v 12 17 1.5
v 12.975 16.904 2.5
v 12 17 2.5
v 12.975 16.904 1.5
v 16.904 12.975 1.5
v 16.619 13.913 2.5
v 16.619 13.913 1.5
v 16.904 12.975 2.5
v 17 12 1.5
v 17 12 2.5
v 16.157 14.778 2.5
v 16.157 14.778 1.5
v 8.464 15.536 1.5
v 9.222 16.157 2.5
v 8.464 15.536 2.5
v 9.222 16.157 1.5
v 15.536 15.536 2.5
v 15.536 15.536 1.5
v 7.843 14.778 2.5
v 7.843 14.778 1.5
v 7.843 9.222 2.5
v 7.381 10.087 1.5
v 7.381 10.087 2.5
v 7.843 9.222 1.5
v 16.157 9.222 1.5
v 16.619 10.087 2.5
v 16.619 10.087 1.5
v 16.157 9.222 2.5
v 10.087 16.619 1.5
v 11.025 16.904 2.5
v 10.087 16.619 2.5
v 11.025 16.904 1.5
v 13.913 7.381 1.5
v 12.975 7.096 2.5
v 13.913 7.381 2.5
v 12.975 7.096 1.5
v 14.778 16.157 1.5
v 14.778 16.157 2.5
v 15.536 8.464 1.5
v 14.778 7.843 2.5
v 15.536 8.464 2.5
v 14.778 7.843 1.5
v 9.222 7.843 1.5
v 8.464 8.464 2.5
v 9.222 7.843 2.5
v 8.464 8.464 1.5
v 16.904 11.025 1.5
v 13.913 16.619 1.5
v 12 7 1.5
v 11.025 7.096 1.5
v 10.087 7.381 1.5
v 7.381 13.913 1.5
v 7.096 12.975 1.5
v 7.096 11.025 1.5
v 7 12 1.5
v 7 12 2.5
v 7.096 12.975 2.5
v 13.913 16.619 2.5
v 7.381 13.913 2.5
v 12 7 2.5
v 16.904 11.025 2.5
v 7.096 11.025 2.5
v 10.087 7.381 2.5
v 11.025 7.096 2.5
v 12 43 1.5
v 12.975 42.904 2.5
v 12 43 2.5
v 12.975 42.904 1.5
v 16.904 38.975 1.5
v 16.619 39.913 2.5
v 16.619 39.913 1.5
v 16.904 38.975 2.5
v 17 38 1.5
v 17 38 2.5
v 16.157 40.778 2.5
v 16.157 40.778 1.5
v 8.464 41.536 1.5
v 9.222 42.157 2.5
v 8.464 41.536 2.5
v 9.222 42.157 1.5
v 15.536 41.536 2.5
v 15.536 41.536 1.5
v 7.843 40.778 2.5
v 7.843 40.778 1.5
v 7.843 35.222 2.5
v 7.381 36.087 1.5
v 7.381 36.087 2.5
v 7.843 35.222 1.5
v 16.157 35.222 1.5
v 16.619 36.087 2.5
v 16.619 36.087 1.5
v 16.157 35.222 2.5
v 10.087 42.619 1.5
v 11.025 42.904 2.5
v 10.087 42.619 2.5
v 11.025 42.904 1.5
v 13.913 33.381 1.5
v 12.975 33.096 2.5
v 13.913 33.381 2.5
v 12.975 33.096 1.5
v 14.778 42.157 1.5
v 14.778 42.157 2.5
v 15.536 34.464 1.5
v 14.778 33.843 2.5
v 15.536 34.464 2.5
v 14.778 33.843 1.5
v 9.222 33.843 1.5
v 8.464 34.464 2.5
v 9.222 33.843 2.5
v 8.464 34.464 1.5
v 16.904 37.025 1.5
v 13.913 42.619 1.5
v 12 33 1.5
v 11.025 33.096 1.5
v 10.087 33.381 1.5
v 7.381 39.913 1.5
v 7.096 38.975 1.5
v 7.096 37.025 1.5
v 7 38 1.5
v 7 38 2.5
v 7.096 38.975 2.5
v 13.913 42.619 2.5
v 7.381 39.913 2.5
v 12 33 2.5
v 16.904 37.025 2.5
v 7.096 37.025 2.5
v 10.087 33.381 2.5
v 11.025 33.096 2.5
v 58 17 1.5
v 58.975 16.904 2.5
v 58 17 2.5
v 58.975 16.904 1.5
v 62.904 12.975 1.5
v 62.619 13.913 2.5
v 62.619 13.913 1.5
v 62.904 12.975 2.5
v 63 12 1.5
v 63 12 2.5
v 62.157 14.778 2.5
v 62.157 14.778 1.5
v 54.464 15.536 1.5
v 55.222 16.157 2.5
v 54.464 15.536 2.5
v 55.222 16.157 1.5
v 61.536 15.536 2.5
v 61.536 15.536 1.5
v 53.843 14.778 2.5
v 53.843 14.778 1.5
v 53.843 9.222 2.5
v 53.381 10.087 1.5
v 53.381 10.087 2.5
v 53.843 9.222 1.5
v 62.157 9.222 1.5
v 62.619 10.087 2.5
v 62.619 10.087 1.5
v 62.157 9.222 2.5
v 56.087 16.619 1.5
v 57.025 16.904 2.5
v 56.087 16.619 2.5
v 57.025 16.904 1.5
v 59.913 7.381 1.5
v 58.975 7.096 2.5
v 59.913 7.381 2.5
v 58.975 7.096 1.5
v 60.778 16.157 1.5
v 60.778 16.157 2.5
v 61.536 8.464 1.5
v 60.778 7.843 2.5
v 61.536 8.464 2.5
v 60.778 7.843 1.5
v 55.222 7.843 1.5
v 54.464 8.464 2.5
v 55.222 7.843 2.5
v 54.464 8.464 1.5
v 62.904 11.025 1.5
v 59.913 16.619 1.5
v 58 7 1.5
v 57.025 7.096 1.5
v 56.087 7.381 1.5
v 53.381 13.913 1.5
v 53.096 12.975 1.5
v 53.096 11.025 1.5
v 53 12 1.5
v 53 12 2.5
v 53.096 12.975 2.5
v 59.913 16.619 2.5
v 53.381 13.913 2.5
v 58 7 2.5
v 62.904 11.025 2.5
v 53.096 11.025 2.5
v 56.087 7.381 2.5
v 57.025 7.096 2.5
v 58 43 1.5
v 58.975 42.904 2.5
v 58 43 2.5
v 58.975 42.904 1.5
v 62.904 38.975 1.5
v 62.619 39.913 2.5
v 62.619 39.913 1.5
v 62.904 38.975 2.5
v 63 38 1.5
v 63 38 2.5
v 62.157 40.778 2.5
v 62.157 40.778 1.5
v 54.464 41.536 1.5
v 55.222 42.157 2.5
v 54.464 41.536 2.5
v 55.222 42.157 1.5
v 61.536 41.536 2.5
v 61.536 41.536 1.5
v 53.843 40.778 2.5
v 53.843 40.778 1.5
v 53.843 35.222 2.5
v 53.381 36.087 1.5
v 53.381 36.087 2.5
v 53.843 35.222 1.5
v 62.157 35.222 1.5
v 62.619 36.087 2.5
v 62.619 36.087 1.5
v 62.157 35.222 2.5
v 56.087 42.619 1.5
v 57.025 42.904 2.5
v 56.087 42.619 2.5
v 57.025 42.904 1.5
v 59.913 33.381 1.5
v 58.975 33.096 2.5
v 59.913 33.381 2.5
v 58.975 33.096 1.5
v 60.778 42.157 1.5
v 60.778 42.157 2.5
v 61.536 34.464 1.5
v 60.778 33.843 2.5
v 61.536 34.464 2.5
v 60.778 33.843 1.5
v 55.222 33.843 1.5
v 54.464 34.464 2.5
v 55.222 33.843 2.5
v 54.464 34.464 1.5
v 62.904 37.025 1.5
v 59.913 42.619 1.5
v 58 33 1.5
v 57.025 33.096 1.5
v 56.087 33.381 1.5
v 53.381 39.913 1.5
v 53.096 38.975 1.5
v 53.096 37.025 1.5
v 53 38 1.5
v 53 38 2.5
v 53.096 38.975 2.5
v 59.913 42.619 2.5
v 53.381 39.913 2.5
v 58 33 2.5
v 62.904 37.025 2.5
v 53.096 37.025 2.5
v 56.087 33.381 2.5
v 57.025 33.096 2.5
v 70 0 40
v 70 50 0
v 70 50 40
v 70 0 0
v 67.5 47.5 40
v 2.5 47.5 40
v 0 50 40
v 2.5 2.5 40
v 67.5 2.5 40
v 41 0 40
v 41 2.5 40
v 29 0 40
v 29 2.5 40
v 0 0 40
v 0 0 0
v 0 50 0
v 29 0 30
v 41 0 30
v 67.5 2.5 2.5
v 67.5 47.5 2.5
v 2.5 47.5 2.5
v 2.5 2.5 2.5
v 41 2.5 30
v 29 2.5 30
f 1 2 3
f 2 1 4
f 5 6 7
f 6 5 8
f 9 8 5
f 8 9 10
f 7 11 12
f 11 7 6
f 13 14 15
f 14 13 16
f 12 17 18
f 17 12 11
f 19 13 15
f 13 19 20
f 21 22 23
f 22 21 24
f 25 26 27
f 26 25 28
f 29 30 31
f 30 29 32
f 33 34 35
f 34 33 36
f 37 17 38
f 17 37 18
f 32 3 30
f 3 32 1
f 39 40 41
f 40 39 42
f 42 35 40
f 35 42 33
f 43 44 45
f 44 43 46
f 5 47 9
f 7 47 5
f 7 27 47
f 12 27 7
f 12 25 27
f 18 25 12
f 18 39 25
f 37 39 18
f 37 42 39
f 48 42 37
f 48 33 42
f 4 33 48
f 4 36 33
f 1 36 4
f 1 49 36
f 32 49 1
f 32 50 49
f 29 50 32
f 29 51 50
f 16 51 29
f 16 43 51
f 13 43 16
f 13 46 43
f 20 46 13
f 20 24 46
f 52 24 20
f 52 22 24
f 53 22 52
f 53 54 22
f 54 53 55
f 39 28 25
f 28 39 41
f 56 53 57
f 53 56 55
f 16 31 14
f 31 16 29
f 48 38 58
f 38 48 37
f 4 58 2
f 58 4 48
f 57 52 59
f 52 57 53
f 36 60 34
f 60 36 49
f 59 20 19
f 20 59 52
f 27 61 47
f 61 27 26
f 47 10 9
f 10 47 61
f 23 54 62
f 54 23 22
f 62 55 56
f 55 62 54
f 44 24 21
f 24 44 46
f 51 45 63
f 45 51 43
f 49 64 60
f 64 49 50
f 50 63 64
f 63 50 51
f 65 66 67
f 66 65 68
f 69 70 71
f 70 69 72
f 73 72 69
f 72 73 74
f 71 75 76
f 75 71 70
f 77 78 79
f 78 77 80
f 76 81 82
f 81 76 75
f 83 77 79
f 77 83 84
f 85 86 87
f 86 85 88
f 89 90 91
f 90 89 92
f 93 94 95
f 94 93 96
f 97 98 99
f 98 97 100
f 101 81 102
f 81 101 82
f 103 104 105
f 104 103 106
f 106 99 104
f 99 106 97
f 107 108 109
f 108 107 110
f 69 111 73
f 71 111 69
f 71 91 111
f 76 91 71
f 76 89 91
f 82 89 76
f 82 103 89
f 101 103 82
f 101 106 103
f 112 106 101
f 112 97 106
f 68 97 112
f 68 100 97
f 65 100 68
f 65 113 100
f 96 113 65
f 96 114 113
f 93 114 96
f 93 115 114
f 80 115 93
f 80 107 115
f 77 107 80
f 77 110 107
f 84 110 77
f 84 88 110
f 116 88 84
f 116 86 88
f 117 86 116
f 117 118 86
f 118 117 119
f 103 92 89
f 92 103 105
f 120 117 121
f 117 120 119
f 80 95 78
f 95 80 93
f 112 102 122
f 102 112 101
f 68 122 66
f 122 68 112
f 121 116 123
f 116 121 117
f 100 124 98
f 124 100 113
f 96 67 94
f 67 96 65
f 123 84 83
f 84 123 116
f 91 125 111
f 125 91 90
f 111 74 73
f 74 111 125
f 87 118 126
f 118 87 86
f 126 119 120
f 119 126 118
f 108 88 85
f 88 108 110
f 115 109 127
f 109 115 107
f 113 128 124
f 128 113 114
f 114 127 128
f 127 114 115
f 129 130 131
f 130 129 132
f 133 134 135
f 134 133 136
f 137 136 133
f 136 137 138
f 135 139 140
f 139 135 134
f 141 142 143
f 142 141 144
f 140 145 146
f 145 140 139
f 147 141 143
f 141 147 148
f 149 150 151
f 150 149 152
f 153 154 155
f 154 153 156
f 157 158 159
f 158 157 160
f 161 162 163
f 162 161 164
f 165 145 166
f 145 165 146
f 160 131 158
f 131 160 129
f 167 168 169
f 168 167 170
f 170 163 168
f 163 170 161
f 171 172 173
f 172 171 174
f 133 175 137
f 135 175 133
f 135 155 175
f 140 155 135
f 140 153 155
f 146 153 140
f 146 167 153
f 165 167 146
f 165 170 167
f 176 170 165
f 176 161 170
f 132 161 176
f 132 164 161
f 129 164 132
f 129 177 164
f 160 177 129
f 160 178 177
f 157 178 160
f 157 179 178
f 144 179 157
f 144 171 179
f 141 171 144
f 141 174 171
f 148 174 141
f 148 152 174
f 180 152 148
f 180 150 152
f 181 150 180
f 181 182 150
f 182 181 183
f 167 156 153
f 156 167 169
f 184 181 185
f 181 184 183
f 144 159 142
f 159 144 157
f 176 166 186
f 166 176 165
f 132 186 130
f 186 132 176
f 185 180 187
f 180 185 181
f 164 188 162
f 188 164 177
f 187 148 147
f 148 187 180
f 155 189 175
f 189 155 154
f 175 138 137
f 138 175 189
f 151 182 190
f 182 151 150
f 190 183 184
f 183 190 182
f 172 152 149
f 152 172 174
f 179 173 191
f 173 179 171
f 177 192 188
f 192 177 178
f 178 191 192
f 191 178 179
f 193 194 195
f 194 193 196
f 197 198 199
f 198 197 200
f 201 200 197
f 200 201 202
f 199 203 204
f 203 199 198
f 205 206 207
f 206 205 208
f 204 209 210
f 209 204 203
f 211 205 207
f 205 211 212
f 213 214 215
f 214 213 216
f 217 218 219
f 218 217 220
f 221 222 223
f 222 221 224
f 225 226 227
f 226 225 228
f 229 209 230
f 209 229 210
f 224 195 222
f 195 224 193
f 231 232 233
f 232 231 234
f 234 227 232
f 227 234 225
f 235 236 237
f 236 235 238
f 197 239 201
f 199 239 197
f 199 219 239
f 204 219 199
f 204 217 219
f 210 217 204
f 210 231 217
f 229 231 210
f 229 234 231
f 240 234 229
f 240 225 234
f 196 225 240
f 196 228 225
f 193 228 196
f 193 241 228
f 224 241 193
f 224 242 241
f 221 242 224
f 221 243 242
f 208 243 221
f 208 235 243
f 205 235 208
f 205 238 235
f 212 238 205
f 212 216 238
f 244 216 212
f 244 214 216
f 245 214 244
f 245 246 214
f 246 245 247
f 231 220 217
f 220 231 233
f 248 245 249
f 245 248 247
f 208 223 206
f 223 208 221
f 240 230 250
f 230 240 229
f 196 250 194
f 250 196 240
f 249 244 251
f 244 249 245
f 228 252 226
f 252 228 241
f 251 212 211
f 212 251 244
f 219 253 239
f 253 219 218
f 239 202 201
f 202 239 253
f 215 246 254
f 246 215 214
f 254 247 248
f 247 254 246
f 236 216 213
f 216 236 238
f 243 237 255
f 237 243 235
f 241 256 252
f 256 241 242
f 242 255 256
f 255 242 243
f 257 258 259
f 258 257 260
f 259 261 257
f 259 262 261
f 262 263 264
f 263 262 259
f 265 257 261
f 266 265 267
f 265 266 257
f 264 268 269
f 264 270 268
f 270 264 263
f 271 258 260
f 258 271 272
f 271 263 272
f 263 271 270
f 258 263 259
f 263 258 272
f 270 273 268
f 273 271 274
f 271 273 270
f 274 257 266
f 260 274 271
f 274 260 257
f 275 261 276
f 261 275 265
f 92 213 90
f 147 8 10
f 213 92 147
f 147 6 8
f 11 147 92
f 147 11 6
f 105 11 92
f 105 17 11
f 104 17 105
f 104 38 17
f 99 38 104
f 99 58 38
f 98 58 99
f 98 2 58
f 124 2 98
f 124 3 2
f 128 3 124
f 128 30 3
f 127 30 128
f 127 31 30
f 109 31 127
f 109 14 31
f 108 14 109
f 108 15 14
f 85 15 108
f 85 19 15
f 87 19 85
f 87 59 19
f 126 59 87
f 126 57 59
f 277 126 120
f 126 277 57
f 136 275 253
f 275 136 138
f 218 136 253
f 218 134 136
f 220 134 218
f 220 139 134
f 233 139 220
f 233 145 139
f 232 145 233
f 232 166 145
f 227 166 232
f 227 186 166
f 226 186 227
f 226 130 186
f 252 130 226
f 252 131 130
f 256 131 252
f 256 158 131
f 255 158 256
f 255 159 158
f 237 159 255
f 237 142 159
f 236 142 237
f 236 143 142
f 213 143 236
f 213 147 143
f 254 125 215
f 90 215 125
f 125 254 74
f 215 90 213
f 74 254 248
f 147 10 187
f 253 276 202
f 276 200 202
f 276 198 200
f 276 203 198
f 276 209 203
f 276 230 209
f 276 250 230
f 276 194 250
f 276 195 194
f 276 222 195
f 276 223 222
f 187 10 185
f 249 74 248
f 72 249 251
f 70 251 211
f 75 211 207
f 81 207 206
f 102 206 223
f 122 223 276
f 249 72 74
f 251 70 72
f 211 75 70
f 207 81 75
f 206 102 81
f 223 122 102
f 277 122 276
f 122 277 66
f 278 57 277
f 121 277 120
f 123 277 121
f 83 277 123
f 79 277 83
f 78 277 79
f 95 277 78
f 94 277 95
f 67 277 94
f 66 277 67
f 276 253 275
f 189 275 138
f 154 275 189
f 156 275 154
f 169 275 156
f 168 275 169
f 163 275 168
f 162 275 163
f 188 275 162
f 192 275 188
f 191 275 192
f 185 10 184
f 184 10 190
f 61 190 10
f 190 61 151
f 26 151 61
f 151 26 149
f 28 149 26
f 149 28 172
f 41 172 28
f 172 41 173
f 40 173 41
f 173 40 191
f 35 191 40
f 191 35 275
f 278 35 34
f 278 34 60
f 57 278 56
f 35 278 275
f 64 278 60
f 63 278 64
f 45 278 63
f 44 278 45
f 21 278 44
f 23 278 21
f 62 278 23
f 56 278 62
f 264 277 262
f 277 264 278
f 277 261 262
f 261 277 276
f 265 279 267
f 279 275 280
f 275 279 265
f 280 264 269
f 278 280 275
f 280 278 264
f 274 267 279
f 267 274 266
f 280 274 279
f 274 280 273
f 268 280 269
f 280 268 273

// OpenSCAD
$fn = 32;

// ----------------------------------------------------------------------
// Enclosure box: both enclosure
// ----------------------------------------------------------------------

// --- parameters (mm) ---
box_l = 70;               // outer length, X
box_w = 50;               // outer width, Y
box_h = 40;               // outer height
wall_t = 2.5;             // wall thickness
boss_r = 5;               // corner boss radius
hole_r = 1.5;             // boss screw hole radius
boss_in = 12;             // boss inset from the corners
notch_w = 12;             // cable notch width
notch_h = 10;             // cable notch height

inner_h = box_h - wall_t;  // cavity depth
boss_h = inner_h - 2;  // corner boss height

difference() {
  cube([box_l, box_w, box_h]);
  translate([wall_t, wall_t, wall_t])
    cube([box_l - 2 * wall_t, box_w - 2 * wall_t, box_h]);
  for (sx = [0, 1], sy = [0, 1])
    translate([sx ? box_l - boss_in : boss_in,
               sy ? box_w - boss_in : boss_in, wall_t - 1]) {
      cylinder(r = boss_r, h = boss_h);
      translate([0, 0, boss_h - 4])
        cylinder(r = hole_r, h = 5);
    }
  translate([box_l / 2 - notch_w / 2, -1, box_h - notch_h])
    cube([notch_w, wall_t + 2, notch_h + 1]);
}
